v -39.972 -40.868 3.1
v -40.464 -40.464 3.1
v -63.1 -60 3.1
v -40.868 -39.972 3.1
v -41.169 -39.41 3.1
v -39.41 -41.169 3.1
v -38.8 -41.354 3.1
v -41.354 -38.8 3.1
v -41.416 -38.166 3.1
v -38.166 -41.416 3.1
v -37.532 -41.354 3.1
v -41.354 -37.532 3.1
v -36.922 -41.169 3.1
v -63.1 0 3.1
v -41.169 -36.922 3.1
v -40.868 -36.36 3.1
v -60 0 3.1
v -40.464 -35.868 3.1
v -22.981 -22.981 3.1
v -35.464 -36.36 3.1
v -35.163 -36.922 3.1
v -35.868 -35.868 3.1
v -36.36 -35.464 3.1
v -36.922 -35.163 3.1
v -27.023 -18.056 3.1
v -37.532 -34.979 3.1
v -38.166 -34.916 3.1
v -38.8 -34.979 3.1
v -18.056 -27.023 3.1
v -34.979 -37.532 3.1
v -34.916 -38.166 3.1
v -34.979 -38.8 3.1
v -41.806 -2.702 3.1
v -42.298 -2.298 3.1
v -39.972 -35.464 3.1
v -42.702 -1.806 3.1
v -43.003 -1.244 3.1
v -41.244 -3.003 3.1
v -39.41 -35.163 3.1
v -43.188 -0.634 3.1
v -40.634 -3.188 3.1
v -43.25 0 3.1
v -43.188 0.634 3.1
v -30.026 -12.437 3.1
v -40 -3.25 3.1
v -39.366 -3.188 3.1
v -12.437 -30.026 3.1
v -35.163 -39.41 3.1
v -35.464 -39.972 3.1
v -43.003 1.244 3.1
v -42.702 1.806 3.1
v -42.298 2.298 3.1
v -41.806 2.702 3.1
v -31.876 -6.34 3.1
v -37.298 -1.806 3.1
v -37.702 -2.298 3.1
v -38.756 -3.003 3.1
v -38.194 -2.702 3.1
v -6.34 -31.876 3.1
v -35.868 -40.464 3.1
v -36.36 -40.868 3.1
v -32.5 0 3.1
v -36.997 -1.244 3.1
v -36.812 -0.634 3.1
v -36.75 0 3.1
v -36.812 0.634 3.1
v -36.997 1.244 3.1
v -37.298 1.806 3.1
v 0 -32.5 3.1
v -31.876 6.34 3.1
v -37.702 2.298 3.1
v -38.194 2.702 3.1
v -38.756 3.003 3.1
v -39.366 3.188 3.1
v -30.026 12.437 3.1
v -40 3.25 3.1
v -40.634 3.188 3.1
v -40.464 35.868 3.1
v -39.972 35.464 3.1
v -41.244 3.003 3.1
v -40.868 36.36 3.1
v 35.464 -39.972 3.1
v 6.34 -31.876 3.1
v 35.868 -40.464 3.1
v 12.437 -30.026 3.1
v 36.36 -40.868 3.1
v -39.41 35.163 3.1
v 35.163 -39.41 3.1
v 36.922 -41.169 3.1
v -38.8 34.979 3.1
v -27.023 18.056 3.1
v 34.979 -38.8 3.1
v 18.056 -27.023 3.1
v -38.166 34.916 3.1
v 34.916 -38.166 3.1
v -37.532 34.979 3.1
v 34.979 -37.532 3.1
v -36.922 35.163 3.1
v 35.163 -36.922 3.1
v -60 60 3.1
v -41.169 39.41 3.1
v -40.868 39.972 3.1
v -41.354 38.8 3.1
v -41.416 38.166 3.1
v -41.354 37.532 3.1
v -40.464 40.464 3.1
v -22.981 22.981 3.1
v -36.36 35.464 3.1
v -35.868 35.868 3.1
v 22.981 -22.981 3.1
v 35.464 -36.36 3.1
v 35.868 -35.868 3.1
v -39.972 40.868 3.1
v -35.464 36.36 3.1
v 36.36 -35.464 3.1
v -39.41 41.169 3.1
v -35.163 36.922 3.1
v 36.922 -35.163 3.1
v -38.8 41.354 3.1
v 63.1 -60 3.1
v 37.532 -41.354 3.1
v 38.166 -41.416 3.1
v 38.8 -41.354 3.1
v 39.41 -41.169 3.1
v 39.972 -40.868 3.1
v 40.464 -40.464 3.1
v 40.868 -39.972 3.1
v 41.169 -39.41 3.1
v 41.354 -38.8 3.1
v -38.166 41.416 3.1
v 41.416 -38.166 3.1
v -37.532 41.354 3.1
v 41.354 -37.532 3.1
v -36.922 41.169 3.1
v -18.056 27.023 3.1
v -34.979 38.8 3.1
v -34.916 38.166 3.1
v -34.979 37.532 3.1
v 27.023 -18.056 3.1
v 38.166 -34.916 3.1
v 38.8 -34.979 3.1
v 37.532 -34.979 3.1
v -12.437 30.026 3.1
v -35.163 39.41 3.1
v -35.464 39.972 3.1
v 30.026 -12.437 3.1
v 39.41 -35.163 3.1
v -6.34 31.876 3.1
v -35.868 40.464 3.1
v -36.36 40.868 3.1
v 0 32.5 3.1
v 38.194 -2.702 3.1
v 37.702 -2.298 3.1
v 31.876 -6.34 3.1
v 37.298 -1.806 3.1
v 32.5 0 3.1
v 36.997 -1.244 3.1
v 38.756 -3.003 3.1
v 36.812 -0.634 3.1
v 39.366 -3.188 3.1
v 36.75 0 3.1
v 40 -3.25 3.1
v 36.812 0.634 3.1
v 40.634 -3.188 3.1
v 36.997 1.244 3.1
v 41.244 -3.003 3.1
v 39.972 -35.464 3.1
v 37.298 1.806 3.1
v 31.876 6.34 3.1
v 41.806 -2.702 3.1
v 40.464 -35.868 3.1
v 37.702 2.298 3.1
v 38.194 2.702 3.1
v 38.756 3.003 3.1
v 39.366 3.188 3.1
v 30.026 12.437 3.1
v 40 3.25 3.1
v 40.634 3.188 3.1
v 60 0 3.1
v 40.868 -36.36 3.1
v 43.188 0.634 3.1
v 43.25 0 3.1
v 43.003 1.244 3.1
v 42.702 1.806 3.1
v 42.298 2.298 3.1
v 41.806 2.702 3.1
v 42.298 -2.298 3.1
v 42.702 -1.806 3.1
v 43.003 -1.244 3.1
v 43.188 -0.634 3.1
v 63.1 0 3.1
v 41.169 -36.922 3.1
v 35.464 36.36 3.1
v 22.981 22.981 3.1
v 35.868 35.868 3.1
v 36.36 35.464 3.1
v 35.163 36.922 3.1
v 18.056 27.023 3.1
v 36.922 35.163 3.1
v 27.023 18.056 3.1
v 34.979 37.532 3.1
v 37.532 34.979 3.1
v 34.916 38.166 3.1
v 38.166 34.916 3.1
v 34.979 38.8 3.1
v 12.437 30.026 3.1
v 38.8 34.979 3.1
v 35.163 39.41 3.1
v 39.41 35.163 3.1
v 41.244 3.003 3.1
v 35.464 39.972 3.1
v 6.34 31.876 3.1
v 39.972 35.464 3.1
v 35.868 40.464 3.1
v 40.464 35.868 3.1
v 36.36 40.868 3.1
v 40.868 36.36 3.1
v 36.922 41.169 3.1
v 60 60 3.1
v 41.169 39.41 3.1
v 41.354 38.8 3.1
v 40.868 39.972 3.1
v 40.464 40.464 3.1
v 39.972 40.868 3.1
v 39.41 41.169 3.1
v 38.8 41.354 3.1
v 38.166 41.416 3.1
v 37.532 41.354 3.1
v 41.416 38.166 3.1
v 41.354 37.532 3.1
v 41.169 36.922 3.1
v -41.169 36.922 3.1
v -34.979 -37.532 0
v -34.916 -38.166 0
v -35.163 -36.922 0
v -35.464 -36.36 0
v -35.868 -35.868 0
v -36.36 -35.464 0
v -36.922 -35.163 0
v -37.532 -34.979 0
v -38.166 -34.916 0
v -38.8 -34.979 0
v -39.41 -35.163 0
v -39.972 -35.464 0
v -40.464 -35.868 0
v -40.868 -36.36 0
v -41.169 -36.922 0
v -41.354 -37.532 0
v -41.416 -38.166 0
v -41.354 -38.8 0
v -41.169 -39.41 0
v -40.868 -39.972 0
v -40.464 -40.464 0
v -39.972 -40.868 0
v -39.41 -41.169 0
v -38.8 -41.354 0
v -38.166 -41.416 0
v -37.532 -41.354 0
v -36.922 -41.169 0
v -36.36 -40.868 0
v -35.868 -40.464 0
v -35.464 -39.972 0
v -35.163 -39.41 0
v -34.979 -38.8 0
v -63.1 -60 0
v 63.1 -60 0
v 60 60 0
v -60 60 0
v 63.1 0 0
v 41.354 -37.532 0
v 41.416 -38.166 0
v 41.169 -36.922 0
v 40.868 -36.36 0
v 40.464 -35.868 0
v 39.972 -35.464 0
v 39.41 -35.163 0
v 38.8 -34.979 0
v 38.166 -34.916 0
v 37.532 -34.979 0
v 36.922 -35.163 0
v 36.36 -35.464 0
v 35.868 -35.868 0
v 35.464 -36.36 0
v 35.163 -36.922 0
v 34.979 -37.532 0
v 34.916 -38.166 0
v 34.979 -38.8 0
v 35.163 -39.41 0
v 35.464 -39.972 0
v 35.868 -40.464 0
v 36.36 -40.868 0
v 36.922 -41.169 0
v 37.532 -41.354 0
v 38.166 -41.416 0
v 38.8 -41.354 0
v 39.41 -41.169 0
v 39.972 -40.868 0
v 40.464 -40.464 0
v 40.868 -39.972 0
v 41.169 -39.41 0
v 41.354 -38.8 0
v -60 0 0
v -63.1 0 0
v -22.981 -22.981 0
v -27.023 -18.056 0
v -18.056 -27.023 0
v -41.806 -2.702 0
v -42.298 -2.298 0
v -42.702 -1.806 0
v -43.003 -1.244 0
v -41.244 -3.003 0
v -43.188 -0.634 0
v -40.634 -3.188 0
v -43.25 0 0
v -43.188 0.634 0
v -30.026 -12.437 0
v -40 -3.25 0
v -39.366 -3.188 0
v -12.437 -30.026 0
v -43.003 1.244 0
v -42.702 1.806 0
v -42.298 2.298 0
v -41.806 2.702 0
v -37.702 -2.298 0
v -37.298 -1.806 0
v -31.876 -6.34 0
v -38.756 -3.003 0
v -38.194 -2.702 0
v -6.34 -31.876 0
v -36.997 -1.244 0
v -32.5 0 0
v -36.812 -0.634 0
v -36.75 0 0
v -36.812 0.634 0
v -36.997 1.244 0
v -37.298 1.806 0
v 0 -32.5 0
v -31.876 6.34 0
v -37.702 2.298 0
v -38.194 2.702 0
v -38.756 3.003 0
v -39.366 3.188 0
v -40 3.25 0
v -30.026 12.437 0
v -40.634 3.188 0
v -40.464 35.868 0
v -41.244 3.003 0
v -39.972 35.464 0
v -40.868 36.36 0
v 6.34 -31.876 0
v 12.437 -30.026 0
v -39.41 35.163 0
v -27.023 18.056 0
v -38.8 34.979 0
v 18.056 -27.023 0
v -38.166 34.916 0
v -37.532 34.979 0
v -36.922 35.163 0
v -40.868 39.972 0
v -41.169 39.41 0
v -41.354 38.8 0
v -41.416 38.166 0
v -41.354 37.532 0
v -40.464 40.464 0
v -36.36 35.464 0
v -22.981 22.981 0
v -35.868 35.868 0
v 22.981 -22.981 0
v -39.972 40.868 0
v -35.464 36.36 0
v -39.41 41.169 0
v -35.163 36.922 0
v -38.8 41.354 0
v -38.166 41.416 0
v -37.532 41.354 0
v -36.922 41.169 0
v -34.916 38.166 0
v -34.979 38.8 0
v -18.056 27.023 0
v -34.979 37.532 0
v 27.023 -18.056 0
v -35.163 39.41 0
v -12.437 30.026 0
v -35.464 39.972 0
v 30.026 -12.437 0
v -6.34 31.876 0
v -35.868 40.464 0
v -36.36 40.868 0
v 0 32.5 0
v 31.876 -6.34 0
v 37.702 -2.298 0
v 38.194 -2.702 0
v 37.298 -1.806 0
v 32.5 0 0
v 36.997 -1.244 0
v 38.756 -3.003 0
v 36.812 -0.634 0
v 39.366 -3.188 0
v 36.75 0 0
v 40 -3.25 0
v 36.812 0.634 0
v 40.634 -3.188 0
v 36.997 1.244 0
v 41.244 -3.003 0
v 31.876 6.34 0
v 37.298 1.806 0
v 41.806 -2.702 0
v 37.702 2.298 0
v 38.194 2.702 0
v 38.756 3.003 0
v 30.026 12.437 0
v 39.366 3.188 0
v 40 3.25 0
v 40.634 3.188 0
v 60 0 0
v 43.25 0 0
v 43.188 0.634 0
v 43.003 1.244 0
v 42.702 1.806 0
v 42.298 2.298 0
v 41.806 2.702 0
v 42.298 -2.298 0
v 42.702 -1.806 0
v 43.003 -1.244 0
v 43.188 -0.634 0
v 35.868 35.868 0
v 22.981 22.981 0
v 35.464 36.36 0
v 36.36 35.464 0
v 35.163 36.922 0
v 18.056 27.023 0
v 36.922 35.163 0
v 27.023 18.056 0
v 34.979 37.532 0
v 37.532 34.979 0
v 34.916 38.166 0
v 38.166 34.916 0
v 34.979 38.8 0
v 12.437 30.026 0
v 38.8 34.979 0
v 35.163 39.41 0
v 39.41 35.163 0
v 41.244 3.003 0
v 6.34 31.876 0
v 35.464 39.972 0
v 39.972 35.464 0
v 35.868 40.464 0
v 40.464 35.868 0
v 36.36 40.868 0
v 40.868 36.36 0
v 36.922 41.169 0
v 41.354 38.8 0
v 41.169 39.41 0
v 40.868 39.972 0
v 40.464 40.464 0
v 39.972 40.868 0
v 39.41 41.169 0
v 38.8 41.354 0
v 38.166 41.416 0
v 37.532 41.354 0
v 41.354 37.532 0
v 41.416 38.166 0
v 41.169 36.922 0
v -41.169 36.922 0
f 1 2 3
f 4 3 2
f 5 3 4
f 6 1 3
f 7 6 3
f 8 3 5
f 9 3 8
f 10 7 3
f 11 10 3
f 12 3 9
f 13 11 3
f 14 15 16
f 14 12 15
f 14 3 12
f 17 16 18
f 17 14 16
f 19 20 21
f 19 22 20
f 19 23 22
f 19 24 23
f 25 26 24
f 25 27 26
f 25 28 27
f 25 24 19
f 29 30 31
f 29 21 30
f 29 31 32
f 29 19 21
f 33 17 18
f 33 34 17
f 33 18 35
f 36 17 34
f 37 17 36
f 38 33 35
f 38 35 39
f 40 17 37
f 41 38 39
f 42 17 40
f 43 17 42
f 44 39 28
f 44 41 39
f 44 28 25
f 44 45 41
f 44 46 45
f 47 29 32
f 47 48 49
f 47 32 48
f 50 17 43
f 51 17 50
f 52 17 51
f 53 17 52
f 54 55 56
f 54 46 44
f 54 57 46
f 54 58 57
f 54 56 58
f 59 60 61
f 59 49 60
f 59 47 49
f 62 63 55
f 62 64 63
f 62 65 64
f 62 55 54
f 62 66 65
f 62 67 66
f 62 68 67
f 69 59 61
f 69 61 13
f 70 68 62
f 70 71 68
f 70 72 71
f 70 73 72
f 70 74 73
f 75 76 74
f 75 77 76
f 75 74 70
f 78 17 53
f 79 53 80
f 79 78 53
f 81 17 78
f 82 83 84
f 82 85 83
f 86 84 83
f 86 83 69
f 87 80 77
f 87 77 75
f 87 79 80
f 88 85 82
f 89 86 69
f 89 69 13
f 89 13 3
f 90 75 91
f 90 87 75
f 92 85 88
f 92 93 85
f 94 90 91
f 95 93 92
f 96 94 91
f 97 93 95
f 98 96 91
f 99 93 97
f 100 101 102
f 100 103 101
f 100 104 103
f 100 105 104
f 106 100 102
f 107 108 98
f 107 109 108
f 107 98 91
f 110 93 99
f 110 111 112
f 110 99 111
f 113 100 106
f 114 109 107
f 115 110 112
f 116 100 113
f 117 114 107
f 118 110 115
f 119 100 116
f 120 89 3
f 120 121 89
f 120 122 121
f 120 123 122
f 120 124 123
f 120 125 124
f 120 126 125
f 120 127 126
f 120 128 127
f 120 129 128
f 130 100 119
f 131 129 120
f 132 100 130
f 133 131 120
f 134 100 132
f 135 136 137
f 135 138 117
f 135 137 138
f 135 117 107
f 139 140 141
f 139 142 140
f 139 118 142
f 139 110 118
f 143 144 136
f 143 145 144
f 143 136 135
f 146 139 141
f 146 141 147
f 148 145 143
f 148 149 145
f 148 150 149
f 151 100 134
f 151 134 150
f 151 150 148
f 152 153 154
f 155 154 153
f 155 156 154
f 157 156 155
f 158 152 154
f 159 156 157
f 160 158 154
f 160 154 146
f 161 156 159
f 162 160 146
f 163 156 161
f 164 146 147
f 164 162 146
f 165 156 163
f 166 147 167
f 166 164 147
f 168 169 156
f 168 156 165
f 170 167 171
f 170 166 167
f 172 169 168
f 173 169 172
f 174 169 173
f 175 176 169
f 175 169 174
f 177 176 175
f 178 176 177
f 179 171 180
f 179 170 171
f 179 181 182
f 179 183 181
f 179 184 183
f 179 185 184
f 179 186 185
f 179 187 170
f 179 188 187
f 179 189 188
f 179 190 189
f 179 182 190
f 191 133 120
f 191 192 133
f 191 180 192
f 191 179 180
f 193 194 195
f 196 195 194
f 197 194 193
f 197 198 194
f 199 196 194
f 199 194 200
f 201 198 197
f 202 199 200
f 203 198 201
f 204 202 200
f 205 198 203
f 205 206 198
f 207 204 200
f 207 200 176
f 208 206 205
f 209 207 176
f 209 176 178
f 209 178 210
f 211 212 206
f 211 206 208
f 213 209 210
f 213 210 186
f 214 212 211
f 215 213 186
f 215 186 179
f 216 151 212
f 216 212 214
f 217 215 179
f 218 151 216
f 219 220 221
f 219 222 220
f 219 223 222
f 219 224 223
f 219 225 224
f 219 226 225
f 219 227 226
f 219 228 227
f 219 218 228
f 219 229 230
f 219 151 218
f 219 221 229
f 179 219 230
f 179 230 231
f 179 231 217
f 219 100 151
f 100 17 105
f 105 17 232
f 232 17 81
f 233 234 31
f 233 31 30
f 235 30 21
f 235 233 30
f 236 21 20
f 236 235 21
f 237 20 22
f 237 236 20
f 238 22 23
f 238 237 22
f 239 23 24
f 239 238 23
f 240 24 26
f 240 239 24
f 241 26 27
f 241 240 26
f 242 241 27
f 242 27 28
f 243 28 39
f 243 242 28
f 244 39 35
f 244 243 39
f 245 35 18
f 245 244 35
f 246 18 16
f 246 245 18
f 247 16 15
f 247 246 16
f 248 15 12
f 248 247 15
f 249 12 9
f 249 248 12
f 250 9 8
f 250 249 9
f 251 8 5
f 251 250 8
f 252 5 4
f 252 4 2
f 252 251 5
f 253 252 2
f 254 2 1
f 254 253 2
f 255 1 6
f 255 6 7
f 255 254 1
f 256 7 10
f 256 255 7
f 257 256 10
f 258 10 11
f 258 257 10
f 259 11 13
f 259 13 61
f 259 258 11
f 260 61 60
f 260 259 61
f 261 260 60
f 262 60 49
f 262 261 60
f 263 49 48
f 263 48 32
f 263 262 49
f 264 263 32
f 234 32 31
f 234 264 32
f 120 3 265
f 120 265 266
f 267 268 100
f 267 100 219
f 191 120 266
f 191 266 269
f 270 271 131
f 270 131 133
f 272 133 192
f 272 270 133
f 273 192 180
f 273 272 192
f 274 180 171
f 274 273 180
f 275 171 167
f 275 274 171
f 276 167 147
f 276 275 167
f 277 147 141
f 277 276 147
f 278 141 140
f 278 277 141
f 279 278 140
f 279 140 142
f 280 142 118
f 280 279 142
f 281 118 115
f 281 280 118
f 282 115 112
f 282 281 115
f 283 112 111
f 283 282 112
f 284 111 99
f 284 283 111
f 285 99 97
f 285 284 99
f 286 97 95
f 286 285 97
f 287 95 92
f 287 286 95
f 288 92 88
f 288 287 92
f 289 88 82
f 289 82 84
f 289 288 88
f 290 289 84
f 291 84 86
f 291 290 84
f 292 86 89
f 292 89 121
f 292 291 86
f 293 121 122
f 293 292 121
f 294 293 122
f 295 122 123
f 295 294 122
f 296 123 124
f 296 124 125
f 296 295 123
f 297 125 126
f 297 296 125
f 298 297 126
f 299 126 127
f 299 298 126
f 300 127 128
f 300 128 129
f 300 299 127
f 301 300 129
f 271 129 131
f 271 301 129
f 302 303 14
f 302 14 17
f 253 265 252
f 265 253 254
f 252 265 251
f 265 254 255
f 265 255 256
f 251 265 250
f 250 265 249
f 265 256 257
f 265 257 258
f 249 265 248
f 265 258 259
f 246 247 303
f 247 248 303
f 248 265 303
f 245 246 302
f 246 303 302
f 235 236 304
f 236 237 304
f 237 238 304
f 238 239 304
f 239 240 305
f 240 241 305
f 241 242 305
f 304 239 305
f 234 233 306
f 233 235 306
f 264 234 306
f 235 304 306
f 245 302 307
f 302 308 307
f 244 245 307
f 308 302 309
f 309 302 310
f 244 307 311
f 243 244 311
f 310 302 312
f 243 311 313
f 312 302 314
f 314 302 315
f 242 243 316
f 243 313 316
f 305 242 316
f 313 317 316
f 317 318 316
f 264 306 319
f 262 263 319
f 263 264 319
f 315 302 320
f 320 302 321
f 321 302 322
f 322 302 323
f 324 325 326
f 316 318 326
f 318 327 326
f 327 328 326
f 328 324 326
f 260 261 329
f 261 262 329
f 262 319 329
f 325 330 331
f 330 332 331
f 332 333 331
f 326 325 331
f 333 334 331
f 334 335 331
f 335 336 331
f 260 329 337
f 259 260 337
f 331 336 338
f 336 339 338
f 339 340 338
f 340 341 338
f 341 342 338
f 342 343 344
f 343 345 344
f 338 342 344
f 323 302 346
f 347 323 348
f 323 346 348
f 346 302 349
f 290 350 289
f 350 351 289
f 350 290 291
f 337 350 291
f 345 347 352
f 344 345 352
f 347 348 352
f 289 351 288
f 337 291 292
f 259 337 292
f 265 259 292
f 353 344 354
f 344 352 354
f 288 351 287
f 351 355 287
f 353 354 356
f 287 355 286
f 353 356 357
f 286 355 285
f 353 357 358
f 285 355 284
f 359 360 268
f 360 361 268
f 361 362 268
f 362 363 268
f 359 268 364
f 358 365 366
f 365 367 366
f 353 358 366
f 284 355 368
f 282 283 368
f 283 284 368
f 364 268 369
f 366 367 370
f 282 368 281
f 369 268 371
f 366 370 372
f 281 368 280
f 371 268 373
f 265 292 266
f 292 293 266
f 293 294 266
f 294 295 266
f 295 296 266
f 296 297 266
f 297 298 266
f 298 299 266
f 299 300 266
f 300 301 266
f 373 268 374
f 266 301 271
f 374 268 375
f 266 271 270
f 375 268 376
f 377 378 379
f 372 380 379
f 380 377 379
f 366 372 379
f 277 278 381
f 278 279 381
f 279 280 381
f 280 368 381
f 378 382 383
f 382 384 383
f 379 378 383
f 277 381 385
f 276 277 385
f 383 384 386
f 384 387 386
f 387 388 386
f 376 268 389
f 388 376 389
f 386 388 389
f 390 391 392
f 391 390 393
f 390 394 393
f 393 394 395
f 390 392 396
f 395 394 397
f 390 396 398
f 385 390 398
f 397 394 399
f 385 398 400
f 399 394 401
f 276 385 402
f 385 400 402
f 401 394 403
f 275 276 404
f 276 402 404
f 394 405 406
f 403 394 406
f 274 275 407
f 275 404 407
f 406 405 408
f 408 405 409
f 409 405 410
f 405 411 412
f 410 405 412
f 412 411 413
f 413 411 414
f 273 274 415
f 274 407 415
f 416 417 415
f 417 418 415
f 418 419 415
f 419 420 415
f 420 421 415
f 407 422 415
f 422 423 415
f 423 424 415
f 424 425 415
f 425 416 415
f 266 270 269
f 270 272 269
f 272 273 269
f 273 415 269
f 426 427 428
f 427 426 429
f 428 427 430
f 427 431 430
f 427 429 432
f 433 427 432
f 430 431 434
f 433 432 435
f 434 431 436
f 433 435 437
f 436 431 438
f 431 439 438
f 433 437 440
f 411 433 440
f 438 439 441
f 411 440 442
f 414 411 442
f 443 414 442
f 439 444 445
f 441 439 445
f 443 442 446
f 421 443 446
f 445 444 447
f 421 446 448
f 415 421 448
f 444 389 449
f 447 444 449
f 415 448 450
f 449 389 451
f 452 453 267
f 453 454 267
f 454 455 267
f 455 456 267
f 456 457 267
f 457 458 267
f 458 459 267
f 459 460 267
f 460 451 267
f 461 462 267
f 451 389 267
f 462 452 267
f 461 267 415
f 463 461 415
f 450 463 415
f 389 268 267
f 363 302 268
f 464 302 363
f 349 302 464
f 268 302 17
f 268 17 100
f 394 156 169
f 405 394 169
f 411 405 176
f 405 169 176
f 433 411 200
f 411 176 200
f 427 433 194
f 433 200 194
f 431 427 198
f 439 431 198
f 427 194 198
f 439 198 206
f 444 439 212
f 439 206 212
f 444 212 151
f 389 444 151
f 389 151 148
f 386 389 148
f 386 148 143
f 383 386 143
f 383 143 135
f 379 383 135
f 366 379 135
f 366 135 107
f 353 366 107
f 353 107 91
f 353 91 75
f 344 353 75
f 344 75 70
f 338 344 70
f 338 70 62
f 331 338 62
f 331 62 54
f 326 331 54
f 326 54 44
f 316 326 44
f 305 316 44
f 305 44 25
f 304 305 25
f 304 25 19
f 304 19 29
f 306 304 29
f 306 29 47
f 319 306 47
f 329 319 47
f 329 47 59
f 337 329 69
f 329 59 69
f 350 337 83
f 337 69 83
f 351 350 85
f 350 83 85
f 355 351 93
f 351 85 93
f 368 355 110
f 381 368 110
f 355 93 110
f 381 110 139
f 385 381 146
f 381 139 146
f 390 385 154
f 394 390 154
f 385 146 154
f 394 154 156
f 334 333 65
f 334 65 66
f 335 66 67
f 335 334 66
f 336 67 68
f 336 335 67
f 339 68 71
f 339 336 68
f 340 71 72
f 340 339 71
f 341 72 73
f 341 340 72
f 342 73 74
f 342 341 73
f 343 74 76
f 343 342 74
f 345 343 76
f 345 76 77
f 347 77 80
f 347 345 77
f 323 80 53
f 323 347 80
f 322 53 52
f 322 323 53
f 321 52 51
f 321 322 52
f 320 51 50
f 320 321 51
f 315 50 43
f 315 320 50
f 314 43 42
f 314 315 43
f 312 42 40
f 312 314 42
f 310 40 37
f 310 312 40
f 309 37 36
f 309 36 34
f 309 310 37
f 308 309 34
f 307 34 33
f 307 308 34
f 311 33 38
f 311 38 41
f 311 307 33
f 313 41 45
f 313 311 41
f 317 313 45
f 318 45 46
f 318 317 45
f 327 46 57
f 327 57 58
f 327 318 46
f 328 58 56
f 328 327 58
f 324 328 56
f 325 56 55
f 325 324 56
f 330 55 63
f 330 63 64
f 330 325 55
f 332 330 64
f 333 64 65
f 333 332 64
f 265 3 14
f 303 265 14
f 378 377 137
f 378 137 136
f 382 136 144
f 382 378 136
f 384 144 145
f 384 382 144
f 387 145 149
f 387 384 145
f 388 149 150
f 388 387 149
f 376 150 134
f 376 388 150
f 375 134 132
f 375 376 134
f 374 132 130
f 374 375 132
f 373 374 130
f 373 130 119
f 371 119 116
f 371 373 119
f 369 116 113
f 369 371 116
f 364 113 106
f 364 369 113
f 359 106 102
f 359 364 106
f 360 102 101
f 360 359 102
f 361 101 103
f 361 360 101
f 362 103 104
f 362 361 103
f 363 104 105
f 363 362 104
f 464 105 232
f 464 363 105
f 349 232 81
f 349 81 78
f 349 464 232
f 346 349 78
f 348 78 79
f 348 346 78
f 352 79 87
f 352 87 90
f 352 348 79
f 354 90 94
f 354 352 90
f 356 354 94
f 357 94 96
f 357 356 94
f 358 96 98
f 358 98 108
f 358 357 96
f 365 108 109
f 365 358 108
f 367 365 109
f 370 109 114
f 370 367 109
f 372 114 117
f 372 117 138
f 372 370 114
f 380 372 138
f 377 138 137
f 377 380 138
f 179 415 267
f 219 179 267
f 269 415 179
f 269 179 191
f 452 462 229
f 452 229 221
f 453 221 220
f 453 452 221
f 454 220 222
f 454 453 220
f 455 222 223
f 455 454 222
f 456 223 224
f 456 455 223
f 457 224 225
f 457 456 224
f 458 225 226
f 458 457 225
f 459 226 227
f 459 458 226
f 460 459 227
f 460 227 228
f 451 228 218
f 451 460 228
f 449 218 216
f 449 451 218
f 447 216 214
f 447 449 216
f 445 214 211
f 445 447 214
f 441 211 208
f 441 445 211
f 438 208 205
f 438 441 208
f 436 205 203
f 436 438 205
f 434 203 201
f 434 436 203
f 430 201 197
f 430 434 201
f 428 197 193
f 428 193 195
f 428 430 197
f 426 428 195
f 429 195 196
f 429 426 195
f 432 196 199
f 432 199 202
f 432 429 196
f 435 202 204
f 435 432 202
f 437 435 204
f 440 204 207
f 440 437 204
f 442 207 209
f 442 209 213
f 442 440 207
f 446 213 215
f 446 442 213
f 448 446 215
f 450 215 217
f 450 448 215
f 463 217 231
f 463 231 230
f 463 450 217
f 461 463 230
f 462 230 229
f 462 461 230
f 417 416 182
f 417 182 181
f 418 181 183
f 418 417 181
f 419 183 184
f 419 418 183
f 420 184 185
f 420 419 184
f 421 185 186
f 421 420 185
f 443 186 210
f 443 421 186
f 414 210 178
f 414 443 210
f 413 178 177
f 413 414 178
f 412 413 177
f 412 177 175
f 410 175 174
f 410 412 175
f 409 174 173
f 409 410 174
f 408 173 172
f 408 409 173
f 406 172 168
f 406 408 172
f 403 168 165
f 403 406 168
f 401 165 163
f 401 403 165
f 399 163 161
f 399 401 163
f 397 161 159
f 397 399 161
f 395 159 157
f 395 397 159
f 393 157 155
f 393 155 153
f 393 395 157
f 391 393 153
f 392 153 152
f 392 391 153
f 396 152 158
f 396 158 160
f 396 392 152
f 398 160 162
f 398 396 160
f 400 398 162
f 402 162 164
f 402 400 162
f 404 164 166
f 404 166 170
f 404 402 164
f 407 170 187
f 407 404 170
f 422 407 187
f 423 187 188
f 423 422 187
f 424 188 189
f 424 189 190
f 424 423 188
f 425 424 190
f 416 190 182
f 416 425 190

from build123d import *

# Parameters (mm, degrees)
SKETCH1_W           = 120
SKETCH1_H           = 120
SKETCH1_R           = 3.25
BOSS_EXTRUDE1_DEPTH = 3.1
SKETCH2_W           = 3.1
SKETCH2_H           = 60
BOSS_EXTRUDE3_DEPTH = 3.1
SKETCH5_R           = 32.5
CUT_EXTRUDE2_DEPTH  = 4.1


with BuildPart() as part:
    # Sketch1 → Boss-Extrude1 (new body)
    with BuildSketch(Plane.XY):
        Rectangle(SKETCH1_W, SKETCH1_H)
        with Locations((-38.166088515, 38.166088515)):
            Circle(SKETCH1_R, mode=Mode.SUBTRACT)
        with Locations((38.166088515, 38.166088515)):
            Circle(SKETCH1_R, mode=Mode.SUBTRACT)
        with Locations((38.166088515, -38.166088515)):
            Circle(SKETCH1_R, mode=Mode.SUBTRACT)
        with Locations((-38.166088515, -38.166088515)):
            Circle(SKETCH1_R, mode=Mode.SUBTRACT)
        with Locations((-40, 0)):
            Circle(SKETCH1_R, mode=Mode.SUBTRACT)
        with Locations((40, 0)):
            Circle(SKETCH1_R, mode=Mode.SUBTRACT)
    extrude(amount=BOSS_EXTRUDE1_DEPTH)

    # Sketch2 → Boss-Extrude3 (add, through all)
    with BuildSketch(Plane.XY.offset(3.1)):
        with Locations((61.55, -30)):
            Rectangle(SKETCH2_W, SKETCH2_H)
        with Locations((-61.55, -30)):
            Rectangle(SKETCH2_W, SKETCH2_H)
    extrude(amount=-BOSS_EXTRUDE3_DEPTH)

    # Sketch5 → Cut-Extrude2 (cut, through all)
    with BuildSketch(Plane.XY.offset(3.1)):
        Circle(SKETCH5_R)
    extrude(amount=-CUT_EXTRUDE2_DEPTH, mode=Mode.SUBTRACT)


solid = part.part
